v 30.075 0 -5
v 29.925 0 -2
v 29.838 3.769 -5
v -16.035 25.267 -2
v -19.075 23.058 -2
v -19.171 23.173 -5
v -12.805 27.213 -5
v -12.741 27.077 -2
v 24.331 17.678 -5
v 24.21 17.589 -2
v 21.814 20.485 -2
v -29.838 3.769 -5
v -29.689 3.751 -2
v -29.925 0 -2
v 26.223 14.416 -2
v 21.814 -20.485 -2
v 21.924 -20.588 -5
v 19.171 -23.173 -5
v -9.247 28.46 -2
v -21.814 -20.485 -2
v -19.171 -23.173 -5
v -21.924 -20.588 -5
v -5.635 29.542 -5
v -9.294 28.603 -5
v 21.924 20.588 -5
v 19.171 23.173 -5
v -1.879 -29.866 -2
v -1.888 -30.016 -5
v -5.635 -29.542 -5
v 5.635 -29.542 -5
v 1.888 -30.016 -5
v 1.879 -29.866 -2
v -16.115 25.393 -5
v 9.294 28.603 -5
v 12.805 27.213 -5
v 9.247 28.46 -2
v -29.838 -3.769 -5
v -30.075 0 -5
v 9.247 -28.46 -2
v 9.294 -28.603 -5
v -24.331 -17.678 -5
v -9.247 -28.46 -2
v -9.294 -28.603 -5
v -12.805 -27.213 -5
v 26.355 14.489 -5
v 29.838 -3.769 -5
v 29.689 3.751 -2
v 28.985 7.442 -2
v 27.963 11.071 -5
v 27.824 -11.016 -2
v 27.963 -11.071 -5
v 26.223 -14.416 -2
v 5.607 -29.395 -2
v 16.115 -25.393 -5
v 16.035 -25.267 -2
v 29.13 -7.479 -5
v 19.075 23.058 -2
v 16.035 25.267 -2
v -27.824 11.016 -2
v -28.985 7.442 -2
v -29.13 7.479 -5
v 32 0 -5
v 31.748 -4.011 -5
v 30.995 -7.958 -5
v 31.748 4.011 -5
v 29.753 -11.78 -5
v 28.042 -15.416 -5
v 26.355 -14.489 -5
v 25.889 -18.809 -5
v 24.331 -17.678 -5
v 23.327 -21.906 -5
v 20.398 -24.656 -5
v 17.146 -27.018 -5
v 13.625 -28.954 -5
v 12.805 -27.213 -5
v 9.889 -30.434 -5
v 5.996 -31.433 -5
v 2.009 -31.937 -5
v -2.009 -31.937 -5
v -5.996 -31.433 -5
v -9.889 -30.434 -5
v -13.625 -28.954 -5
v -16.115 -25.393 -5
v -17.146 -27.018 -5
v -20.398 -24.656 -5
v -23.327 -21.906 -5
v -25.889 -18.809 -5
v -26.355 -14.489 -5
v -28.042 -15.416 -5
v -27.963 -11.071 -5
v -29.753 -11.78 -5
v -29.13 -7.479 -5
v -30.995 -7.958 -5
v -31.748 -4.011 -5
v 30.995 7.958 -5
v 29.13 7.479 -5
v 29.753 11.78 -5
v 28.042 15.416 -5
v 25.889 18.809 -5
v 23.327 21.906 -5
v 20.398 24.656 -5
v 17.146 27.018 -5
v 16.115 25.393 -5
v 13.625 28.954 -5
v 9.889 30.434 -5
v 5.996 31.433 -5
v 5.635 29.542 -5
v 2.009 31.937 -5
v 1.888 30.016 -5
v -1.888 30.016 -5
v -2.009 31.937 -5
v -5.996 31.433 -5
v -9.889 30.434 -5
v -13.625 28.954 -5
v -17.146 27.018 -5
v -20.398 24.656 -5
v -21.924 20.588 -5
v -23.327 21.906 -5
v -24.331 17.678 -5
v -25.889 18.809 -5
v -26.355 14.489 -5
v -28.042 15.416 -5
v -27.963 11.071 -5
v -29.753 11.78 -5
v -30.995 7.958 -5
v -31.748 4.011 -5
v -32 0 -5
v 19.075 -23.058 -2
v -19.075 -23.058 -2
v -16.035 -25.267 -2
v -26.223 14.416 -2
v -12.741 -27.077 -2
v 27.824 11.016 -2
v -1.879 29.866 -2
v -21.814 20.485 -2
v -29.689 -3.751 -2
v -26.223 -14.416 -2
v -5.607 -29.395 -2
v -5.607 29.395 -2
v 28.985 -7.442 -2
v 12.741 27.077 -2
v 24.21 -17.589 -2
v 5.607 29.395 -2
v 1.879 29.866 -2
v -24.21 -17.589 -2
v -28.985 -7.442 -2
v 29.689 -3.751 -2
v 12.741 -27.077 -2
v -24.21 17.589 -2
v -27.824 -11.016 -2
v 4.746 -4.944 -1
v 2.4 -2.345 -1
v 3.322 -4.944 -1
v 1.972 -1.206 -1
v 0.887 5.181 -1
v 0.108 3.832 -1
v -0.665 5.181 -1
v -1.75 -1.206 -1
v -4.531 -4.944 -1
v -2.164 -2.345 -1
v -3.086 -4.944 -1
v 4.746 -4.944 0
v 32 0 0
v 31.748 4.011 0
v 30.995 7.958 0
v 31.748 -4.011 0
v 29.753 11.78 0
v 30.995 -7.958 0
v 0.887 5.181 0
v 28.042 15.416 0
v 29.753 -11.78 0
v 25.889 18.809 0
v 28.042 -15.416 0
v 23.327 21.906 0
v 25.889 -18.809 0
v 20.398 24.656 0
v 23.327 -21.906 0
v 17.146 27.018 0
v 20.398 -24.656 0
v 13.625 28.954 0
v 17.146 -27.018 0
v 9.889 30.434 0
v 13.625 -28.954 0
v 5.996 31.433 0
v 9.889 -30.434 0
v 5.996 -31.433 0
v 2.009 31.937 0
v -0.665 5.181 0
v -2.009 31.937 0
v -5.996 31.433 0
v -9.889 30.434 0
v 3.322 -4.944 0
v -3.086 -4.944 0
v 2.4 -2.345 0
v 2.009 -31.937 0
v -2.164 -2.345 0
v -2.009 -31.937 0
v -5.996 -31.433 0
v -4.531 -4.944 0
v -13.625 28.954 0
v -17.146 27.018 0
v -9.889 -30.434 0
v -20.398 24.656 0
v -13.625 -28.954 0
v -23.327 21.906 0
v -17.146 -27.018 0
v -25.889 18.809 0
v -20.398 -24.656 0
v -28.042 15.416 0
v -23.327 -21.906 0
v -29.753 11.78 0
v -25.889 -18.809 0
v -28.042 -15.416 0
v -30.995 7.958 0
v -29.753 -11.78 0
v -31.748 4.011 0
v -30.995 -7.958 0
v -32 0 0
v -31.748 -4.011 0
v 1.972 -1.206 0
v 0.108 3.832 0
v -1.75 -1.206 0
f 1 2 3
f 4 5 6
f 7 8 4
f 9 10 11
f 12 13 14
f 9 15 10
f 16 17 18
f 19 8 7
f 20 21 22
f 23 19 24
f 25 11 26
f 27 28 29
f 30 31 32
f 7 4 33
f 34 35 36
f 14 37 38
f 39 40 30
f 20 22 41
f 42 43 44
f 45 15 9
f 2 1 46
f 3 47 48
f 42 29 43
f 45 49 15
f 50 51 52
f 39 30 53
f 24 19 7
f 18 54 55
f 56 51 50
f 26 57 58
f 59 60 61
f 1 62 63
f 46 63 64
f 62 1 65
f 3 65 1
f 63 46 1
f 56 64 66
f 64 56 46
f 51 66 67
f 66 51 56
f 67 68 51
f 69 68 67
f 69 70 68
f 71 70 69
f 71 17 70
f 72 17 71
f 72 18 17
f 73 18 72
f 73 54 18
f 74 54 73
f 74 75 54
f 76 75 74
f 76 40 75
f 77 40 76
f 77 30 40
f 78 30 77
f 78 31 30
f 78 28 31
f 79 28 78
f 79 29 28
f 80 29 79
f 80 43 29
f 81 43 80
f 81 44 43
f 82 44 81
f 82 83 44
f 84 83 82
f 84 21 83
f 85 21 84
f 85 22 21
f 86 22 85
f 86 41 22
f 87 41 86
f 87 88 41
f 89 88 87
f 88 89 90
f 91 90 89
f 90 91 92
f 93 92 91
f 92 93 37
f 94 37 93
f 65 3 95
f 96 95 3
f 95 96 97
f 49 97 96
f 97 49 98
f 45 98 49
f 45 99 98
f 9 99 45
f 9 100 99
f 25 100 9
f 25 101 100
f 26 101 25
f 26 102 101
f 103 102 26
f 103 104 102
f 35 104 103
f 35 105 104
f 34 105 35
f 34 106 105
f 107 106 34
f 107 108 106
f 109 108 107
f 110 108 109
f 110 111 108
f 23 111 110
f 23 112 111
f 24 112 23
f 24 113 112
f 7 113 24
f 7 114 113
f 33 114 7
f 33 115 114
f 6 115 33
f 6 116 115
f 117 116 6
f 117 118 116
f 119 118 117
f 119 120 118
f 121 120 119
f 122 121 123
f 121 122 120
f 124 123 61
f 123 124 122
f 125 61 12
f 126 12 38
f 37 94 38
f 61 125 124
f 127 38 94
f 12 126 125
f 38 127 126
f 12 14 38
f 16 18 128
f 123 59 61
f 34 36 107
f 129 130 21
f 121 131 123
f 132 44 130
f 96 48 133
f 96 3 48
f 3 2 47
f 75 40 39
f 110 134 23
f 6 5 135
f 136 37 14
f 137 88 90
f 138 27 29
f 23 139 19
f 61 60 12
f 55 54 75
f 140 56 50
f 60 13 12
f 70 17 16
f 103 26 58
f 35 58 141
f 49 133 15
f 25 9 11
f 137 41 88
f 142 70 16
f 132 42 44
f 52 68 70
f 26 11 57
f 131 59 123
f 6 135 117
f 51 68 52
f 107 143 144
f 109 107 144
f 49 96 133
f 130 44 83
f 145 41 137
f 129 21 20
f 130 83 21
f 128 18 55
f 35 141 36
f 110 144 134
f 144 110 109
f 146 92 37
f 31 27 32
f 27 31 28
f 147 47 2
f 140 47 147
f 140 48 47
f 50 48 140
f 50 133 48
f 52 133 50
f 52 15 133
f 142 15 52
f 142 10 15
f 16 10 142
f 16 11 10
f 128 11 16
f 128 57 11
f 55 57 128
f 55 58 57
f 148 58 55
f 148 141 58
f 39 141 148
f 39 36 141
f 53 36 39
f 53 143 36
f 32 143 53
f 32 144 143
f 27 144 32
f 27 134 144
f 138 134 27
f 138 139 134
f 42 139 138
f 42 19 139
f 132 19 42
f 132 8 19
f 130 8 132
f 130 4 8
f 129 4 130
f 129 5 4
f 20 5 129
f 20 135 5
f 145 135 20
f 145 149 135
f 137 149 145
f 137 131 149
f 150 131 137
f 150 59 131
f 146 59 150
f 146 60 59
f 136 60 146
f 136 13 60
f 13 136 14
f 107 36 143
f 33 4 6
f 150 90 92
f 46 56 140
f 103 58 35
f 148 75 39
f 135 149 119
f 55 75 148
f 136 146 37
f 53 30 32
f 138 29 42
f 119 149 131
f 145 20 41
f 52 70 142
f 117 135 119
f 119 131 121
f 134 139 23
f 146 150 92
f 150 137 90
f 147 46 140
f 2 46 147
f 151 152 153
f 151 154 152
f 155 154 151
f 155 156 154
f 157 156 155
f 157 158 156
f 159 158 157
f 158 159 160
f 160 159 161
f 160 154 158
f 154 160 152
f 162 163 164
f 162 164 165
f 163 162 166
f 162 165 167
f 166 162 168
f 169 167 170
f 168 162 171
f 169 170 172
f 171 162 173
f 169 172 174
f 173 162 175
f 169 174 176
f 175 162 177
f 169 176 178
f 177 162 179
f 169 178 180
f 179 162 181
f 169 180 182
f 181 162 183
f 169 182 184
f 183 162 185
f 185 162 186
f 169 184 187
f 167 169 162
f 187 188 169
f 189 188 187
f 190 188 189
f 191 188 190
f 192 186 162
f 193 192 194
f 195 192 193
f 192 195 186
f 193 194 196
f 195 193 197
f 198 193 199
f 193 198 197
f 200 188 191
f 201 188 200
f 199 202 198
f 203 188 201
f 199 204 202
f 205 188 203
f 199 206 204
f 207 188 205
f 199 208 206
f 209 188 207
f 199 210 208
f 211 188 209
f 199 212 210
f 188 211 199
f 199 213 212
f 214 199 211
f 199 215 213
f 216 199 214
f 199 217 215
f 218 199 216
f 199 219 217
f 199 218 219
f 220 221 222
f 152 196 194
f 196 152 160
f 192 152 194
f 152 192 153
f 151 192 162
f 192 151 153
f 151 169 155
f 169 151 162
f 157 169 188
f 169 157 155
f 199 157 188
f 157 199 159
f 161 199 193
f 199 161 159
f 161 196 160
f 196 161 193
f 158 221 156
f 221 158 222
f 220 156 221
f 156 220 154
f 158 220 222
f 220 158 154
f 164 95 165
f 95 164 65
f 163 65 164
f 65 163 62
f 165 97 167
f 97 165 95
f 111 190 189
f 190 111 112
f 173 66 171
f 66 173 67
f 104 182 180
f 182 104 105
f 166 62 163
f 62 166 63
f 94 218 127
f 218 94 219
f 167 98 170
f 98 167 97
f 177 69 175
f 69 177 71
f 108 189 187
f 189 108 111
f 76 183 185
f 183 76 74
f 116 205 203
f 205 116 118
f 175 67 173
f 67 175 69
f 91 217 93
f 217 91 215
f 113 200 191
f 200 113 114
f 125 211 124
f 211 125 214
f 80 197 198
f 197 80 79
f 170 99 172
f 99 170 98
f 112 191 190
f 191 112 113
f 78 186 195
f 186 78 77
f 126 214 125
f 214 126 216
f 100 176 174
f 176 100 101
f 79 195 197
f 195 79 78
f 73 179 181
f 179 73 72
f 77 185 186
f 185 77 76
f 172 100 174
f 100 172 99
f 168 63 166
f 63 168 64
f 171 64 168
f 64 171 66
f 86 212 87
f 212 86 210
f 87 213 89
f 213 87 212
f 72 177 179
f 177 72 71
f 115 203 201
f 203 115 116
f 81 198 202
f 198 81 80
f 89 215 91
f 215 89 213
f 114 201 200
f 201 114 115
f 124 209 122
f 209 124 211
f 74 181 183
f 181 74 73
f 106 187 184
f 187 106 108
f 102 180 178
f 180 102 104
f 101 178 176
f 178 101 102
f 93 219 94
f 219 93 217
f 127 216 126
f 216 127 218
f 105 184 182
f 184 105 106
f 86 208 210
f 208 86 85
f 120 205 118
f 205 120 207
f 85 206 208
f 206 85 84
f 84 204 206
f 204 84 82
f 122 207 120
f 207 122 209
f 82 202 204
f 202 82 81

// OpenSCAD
$fn = 50;

difference() {
	union() {
		translate(v = [0, 0, -5.0]) {
			cylinder(h = 5, r = 32.0);
		}
	}
	union() {
		#translate(v = [0, 0, -5.0]) {
			cylinder(h = 3, r1 = 30.075, r2 = 29.925);
		}
		translate(v = [0, 0, -1]) {
			linear_extrude(height = 1) {
				text(font = "Impact", halign = "center", size = 10, text = "A", valign = "center");
			}
		}
	}
}
